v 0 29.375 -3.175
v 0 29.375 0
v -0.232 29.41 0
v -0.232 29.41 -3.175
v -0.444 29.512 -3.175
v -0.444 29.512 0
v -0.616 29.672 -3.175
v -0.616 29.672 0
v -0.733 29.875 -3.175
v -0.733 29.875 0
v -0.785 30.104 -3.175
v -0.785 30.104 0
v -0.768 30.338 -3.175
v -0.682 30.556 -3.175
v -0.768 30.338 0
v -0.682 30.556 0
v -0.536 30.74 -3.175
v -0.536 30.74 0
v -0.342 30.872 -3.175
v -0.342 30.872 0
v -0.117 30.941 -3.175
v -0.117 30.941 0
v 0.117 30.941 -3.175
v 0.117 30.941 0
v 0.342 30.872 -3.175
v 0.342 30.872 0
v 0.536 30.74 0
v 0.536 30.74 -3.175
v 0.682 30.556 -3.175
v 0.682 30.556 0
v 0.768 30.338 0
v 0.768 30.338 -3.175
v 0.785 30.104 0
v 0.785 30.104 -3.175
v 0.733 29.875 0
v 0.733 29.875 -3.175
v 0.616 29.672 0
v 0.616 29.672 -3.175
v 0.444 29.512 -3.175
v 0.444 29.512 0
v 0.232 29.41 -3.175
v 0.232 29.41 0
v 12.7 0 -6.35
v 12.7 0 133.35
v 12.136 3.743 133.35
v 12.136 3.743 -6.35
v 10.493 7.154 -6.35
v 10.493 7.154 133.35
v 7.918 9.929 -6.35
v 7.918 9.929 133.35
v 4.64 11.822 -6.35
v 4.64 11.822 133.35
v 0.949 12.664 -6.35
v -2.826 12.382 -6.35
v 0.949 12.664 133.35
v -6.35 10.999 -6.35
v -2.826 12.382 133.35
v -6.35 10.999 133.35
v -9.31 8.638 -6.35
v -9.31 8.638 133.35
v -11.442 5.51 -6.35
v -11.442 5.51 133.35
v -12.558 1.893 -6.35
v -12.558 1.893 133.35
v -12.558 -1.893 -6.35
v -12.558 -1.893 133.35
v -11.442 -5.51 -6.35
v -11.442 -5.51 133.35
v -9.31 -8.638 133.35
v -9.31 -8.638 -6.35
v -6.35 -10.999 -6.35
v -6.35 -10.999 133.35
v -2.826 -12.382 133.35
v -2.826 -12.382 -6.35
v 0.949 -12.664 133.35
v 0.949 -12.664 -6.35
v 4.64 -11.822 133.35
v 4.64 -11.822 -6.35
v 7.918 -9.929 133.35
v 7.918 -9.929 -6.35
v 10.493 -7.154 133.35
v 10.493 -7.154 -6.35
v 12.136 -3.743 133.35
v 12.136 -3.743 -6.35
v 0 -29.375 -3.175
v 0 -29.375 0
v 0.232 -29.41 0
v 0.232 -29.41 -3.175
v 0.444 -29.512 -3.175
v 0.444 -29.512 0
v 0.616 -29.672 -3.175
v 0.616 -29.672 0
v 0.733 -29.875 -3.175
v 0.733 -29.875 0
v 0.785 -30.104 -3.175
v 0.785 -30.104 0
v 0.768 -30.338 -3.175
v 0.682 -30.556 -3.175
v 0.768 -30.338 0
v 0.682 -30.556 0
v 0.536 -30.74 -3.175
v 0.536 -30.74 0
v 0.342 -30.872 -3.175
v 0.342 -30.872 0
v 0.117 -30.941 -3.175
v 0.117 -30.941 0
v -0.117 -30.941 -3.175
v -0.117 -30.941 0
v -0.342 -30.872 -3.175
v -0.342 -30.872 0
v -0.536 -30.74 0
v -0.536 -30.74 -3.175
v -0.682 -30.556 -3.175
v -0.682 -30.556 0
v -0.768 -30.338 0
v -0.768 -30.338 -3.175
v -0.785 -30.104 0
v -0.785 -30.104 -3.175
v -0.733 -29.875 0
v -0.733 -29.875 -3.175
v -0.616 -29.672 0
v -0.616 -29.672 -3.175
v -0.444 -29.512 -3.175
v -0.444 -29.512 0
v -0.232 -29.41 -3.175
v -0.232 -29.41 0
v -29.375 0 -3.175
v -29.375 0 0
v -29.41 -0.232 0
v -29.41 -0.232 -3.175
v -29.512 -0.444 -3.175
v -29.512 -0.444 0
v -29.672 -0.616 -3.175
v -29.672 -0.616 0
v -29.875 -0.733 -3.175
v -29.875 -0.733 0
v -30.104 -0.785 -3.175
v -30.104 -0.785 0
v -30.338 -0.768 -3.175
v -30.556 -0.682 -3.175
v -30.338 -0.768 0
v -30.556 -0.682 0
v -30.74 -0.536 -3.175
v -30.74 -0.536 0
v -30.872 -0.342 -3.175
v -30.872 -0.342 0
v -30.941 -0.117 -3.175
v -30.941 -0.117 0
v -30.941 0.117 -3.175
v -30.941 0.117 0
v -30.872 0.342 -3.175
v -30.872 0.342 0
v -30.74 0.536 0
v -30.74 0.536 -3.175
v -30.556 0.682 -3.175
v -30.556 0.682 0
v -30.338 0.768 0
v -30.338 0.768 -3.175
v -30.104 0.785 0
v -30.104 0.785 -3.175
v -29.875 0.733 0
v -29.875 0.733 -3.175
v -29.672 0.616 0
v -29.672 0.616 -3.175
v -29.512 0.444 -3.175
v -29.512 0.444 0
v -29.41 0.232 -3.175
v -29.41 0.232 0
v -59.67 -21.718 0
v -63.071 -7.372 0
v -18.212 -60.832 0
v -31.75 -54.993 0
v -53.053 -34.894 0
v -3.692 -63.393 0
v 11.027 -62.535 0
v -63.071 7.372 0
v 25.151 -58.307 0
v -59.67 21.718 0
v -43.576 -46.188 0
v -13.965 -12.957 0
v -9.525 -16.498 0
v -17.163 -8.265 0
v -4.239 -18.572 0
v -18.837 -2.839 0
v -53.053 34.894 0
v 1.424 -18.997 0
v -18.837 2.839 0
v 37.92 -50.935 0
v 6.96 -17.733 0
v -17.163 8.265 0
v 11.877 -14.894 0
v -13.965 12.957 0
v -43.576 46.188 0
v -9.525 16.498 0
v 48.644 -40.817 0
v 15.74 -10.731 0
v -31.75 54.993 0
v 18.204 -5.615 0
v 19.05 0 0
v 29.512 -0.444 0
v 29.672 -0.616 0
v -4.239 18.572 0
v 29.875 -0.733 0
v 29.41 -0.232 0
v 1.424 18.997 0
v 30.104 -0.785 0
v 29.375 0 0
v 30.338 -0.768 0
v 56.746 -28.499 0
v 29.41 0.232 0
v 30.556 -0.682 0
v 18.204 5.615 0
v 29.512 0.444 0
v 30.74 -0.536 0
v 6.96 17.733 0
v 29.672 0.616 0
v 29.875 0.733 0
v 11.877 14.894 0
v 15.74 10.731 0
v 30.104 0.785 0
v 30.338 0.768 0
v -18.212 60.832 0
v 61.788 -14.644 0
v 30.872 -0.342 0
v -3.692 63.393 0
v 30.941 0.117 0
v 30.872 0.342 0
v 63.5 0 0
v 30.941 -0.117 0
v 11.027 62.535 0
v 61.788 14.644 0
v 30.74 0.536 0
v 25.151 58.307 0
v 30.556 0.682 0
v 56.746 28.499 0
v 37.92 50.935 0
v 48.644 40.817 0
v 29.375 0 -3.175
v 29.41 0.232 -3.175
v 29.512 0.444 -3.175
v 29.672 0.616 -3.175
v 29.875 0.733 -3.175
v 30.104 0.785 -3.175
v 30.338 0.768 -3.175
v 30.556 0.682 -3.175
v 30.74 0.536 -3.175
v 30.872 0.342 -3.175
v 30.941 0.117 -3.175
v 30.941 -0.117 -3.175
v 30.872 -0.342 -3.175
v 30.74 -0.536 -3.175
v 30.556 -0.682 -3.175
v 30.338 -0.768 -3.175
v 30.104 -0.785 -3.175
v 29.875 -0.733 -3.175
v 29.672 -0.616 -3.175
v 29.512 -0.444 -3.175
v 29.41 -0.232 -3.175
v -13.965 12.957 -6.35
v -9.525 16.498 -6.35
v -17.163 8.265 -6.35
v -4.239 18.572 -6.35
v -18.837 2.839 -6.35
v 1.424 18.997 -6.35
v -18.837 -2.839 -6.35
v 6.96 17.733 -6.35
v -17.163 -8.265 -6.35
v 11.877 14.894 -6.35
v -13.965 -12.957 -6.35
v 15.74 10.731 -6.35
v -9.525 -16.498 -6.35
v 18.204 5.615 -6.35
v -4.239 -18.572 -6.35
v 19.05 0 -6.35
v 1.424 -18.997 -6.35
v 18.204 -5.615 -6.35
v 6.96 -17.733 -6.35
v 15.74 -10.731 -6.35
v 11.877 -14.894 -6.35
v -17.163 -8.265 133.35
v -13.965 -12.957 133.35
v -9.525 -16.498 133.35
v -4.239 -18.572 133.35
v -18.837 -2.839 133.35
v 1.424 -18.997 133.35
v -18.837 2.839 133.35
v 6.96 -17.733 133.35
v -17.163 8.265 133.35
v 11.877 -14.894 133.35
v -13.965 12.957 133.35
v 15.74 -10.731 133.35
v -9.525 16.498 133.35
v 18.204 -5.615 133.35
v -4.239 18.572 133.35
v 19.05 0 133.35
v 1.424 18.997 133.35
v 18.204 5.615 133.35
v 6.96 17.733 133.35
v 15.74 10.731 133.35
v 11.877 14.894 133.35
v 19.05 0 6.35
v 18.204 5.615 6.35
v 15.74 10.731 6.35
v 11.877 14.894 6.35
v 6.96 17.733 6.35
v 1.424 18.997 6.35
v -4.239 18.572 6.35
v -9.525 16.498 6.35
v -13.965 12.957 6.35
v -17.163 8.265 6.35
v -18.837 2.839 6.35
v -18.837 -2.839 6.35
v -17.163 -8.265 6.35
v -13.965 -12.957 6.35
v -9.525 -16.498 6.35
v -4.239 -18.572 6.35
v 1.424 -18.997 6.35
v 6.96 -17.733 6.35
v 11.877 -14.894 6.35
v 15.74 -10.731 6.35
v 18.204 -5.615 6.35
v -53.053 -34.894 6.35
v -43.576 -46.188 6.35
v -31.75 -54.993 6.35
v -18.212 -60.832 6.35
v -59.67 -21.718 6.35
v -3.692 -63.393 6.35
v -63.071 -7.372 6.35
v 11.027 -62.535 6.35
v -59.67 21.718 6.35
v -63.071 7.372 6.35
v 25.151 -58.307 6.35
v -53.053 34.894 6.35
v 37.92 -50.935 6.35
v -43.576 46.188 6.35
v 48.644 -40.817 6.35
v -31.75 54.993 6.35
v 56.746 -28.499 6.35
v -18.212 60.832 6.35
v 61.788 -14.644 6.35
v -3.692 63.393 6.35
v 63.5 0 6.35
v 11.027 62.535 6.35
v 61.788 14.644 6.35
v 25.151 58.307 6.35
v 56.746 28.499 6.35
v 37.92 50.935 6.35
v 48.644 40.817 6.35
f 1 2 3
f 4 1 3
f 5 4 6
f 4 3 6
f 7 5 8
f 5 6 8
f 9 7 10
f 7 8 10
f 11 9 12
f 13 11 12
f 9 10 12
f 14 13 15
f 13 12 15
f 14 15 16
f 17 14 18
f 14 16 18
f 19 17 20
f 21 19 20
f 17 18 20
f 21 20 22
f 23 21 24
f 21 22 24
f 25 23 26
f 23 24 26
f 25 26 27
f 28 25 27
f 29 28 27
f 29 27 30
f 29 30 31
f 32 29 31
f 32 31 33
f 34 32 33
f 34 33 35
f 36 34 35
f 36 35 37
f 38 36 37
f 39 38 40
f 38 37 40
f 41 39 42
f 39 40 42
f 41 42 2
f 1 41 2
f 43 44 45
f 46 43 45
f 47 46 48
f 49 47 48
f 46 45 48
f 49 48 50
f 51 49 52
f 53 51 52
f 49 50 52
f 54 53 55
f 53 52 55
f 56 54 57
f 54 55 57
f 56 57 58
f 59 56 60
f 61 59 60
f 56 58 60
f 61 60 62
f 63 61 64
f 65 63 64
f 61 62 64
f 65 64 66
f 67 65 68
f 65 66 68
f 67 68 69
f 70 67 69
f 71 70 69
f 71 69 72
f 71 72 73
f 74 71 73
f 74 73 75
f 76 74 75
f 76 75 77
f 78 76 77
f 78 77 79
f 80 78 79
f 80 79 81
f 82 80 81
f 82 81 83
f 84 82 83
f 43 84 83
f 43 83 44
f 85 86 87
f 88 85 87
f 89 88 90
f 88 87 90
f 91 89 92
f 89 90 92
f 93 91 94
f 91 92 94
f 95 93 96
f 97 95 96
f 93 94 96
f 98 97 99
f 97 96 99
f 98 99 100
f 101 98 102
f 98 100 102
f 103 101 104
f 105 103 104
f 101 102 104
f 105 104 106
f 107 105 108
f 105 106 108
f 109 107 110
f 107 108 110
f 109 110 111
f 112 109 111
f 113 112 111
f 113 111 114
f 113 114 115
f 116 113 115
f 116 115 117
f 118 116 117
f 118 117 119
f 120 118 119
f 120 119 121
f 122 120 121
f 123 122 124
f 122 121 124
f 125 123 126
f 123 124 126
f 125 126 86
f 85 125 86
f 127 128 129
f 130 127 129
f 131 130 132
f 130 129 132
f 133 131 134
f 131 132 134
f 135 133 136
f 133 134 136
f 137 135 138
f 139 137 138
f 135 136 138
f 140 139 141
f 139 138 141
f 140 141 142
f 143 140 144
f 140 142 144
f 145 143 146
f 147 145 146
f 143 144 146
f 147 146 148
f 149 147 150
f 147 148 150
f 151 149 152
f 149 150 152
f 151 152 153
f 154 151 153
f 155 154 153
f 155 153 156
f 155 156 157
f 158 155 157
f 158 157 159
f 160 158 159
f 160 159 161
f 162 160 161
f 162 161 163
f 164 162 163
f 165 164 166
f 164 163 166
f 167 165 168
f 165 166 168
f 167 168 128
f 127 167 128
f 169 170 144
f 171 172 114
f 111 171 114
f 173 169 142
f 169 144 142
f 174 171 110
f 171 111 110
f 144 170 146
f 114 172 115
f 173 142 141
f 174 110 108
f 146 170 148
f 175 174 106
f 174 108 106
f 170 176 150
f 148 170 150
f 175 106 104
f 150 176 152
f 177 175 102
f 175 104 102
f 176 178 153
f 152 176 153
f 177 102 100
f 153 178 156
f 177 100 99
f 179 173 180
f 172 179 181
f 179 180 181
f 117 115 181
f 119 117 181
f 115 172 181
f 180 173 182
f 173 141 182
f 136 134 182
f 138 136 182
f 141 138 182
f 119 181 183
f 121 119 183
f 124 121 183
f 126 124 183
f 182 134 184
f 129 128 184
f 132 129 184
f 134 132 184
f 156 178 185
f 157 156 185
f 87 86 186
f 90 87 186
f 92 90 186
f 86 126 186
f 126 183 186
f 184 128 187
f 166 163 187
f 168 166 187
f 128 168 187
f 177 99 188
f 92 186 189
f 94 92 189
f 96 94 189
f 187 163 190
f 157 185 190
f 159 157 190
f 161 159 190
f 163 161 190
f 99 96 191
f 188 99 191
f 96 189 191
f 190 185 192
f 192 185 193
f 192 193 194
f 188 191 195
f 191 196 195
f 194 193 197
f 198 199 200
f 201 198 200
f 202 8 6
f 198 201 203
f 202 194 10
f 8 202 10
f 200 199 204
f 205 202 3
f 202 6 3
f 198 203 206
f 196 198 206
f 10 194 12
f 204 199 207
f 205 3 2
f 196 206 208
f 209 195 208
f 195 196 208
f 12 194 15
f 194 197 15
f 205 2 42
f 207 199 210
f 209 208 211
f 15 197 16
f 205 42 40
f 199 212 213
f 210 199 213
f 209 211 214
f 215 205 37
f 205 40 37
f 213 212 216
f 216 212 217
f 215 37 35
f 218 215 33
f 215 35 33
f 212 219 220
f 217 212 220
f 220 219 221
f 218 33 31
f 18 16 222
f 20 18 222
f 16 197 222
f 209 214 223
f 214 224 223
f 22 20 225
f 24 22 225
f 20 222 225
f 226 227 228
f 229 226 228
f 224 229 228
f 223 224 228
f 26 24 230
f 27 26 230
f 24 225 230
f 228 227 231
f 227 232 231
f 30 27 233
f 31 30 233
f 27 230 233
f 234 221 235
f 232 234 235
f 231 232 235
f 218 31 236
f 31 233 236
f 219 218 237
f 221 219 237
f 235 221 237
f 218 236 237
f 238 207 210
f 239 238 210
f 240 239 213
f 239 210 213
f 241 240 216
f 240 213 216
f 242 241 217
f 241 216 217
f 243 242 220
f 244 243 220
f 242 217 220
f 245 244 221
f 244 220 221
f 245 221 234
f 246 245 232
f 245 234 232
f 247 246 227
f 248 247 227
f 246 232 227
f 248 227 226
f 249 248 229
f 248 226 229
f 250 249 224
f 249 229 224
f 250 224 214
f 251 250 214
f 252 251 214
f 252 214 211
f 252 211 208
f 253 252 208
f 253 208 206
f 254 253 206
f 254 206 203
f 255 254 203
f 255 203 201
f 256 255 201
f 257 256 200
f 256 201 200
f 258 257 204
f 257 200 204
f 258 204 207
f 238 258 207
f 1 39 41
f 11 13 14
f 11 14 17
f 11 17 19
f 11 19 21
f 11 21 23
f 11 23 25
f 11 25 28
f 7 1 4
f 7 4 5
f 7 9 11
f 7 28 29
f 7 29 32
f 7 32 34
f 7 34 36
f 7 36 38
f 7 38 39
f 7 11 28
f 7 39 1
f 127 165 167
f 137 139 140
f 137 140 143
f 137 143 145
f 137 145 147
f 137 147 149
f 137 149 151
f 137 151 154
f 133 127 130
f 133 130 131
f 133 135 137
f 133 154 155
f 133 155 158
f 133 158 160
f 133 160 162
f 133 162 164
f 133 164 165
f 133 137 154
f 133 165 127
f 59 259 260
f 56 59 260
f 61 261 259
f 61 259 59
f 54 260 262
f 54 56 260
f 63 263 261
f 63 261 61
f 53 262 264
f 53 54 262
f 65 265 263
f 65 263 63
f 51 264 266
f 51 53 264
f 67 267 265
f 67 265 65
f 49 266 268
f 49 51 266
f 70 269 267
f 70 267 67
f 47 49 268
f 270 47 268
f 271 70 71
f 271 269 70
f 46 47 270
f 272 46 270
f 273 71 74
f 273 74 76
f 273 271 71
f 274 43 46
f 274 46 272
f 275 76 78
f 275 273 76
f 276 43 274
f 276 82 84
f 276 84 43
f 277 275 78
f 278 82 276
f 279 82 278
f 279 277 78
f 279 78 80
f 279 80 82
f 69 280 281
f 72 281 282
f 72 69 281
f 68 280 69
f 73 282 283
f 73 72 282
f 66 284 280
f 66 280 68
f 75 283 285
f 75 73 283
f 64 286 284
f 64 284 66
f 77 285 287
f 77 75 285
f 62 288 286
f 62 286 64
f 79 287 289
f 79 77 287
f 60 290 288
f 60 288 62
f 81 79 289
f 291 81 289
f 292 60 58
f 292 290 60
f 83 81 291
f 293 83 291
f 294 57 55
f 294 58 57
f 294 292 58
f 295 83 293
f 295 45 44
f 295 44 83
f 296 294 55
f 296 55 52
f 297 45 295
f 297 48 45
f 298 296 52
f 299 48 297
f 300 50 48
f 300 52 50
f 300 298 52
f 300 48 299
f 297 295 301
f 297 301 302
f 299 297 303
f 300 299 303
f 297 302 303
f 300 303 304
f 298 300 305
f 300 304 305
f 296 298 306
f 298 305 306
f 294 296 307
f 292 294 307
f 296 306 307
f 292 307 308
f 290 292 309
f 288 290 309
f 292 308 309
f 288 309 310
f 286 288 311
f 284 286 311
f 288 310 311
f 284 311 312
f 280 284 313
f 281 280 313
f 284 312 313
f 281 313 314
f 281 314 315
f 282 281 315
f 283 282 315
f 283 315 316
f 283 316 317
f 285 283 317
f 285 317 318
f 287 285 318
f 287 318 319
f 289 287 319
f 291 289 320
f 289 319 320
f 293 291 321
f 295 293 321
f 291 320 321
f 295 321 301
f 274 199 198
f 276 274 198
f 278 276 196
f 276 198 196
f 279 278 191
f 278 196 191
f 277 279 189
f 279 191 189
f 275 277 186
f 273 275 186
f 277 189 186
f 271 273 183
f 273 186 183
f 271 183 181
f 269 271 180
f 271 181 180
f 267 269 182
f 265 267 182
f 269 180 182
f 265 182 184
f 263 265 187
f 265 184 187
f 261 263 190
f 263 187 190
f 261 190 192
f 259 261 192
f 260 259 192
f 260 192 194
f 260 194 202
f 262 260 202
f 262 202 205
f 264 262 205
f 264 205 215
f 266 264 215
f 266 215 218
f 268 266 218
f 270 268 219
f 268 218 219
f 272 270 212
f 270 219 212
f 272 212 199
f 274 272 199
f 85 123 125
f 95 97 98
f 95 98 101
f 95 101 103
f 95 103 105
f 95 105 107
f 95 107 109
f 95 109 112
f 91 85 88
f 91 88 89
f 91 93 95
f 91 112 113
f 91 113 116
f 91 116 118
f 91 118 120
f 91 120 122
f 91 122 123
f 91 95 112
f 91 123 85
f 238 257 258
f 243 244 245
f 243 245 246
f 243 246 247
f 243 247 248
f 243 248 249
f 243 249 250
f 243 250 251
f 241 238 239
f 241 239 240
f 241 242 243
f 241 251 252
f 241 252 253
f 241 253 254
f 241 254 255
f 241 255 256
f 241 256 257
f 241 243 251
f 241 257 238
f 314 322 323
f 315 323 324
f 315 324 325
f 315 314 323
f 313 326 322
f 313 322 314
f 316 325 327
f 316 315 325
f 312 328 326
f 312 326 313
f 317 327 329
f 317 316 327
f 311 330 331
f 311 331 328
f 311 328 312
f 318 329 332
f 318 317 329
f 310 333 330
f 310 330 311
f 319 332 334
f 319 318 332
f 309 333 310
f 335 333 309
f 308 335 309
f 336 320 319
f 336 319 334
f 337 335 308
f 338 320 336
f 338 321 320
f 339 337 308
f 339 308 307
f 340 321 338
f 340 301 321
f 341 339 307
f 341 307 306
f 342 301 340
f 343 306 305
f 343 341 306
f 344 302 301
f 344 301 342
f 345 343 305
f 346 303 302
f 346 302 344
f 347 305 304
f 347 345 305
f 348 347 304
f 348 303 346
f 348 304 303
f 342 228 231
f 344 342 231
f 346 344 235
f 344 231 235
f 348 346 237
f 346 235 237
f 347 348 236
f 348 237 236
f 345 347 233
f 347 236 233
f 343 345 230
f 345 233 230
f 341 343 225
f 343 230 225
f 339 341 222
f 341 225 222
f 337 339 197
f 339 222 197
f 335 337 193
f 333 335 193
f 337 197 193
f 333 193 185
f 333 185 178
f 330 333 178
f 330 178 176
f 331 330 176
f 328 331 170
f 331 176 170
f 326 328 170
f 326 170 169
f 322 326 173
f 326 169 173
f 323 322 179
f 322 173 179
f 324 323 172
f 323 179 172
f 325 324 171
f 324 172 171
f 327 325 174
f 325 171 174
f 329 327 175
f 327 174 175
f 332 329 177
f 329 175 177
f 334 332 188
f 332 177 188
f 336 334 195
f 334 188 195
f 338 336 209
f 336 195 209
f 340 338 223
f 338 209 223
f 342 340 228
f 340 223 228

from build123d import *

# Parameters (mm, degrees)
F0_R            = 63.5
F1_DEPTH        = 6.35
F2_R            = 0.7874
F3_DEPTH        = 3.175
F3_COPIES_COUNT = 4
F4_R            = 19.05
F5_DEPTH        = 6.35
F6_R            = 19.05
F7_DEPTH        = 127
F8_R            = 12.7
F9_DEPTH        = 139.701


# Not quite as in the source:
# - a pattern or mirror of a feature is missing from the dataset's text; its kind, count and spacing are read off the source's solid


with BuildPart() as f1:
    # F0 (on Top) → F1 (new body)
    with BuildSketch(Plane.XY):
        Circle(F0_R)
    extrude(amount=F1_DEPTH)

    # F2 (on face) → F3 (join)
    with BuildSketch(Plane(origin=(0, 0, 0), x_dir=(1, 0, 0), z_dir=(0, 0, -1))):
        with Locations((-30.1625, 0)):
            Circle(F2_R)
    f3 = extrude(amount=F3_DEPTH)

    # F3_copies: F3 ×4 about axis
    f3_copies_axis = Axis((0, 0, 0), (0, 0, 1))
    for i in range(1, F3_COPIES_COUNT):
        add(f3.rotate(f3_copies_axis, i * 360 / F3_COPIES_COUNT))

    # F4 (on face) → F5 (join)
    with BuildSketch(Plane(origin=(0, 0, 0), x_dir=(1, 0, 0), z_dir=(0, 0, -1))):
        Circle(F4_R)
    extrude(amount=F5_DEPTH)

    # F6 (on face) → F7 (join)
    with BuildSketch(Plane.XY.offset(6.35)):
        Circle(F6_R)
    extrude(amount=F7_DEPTH)

    # F8 (on face) → F9 (cut, through all)
    with BuildSketch(Plane.XY.offset(133.35)):
        Circle(F8_R)
    extrude(amount=-F9_DEPTH, mode=Mode.SUBTRACT)


solid = f1.part
